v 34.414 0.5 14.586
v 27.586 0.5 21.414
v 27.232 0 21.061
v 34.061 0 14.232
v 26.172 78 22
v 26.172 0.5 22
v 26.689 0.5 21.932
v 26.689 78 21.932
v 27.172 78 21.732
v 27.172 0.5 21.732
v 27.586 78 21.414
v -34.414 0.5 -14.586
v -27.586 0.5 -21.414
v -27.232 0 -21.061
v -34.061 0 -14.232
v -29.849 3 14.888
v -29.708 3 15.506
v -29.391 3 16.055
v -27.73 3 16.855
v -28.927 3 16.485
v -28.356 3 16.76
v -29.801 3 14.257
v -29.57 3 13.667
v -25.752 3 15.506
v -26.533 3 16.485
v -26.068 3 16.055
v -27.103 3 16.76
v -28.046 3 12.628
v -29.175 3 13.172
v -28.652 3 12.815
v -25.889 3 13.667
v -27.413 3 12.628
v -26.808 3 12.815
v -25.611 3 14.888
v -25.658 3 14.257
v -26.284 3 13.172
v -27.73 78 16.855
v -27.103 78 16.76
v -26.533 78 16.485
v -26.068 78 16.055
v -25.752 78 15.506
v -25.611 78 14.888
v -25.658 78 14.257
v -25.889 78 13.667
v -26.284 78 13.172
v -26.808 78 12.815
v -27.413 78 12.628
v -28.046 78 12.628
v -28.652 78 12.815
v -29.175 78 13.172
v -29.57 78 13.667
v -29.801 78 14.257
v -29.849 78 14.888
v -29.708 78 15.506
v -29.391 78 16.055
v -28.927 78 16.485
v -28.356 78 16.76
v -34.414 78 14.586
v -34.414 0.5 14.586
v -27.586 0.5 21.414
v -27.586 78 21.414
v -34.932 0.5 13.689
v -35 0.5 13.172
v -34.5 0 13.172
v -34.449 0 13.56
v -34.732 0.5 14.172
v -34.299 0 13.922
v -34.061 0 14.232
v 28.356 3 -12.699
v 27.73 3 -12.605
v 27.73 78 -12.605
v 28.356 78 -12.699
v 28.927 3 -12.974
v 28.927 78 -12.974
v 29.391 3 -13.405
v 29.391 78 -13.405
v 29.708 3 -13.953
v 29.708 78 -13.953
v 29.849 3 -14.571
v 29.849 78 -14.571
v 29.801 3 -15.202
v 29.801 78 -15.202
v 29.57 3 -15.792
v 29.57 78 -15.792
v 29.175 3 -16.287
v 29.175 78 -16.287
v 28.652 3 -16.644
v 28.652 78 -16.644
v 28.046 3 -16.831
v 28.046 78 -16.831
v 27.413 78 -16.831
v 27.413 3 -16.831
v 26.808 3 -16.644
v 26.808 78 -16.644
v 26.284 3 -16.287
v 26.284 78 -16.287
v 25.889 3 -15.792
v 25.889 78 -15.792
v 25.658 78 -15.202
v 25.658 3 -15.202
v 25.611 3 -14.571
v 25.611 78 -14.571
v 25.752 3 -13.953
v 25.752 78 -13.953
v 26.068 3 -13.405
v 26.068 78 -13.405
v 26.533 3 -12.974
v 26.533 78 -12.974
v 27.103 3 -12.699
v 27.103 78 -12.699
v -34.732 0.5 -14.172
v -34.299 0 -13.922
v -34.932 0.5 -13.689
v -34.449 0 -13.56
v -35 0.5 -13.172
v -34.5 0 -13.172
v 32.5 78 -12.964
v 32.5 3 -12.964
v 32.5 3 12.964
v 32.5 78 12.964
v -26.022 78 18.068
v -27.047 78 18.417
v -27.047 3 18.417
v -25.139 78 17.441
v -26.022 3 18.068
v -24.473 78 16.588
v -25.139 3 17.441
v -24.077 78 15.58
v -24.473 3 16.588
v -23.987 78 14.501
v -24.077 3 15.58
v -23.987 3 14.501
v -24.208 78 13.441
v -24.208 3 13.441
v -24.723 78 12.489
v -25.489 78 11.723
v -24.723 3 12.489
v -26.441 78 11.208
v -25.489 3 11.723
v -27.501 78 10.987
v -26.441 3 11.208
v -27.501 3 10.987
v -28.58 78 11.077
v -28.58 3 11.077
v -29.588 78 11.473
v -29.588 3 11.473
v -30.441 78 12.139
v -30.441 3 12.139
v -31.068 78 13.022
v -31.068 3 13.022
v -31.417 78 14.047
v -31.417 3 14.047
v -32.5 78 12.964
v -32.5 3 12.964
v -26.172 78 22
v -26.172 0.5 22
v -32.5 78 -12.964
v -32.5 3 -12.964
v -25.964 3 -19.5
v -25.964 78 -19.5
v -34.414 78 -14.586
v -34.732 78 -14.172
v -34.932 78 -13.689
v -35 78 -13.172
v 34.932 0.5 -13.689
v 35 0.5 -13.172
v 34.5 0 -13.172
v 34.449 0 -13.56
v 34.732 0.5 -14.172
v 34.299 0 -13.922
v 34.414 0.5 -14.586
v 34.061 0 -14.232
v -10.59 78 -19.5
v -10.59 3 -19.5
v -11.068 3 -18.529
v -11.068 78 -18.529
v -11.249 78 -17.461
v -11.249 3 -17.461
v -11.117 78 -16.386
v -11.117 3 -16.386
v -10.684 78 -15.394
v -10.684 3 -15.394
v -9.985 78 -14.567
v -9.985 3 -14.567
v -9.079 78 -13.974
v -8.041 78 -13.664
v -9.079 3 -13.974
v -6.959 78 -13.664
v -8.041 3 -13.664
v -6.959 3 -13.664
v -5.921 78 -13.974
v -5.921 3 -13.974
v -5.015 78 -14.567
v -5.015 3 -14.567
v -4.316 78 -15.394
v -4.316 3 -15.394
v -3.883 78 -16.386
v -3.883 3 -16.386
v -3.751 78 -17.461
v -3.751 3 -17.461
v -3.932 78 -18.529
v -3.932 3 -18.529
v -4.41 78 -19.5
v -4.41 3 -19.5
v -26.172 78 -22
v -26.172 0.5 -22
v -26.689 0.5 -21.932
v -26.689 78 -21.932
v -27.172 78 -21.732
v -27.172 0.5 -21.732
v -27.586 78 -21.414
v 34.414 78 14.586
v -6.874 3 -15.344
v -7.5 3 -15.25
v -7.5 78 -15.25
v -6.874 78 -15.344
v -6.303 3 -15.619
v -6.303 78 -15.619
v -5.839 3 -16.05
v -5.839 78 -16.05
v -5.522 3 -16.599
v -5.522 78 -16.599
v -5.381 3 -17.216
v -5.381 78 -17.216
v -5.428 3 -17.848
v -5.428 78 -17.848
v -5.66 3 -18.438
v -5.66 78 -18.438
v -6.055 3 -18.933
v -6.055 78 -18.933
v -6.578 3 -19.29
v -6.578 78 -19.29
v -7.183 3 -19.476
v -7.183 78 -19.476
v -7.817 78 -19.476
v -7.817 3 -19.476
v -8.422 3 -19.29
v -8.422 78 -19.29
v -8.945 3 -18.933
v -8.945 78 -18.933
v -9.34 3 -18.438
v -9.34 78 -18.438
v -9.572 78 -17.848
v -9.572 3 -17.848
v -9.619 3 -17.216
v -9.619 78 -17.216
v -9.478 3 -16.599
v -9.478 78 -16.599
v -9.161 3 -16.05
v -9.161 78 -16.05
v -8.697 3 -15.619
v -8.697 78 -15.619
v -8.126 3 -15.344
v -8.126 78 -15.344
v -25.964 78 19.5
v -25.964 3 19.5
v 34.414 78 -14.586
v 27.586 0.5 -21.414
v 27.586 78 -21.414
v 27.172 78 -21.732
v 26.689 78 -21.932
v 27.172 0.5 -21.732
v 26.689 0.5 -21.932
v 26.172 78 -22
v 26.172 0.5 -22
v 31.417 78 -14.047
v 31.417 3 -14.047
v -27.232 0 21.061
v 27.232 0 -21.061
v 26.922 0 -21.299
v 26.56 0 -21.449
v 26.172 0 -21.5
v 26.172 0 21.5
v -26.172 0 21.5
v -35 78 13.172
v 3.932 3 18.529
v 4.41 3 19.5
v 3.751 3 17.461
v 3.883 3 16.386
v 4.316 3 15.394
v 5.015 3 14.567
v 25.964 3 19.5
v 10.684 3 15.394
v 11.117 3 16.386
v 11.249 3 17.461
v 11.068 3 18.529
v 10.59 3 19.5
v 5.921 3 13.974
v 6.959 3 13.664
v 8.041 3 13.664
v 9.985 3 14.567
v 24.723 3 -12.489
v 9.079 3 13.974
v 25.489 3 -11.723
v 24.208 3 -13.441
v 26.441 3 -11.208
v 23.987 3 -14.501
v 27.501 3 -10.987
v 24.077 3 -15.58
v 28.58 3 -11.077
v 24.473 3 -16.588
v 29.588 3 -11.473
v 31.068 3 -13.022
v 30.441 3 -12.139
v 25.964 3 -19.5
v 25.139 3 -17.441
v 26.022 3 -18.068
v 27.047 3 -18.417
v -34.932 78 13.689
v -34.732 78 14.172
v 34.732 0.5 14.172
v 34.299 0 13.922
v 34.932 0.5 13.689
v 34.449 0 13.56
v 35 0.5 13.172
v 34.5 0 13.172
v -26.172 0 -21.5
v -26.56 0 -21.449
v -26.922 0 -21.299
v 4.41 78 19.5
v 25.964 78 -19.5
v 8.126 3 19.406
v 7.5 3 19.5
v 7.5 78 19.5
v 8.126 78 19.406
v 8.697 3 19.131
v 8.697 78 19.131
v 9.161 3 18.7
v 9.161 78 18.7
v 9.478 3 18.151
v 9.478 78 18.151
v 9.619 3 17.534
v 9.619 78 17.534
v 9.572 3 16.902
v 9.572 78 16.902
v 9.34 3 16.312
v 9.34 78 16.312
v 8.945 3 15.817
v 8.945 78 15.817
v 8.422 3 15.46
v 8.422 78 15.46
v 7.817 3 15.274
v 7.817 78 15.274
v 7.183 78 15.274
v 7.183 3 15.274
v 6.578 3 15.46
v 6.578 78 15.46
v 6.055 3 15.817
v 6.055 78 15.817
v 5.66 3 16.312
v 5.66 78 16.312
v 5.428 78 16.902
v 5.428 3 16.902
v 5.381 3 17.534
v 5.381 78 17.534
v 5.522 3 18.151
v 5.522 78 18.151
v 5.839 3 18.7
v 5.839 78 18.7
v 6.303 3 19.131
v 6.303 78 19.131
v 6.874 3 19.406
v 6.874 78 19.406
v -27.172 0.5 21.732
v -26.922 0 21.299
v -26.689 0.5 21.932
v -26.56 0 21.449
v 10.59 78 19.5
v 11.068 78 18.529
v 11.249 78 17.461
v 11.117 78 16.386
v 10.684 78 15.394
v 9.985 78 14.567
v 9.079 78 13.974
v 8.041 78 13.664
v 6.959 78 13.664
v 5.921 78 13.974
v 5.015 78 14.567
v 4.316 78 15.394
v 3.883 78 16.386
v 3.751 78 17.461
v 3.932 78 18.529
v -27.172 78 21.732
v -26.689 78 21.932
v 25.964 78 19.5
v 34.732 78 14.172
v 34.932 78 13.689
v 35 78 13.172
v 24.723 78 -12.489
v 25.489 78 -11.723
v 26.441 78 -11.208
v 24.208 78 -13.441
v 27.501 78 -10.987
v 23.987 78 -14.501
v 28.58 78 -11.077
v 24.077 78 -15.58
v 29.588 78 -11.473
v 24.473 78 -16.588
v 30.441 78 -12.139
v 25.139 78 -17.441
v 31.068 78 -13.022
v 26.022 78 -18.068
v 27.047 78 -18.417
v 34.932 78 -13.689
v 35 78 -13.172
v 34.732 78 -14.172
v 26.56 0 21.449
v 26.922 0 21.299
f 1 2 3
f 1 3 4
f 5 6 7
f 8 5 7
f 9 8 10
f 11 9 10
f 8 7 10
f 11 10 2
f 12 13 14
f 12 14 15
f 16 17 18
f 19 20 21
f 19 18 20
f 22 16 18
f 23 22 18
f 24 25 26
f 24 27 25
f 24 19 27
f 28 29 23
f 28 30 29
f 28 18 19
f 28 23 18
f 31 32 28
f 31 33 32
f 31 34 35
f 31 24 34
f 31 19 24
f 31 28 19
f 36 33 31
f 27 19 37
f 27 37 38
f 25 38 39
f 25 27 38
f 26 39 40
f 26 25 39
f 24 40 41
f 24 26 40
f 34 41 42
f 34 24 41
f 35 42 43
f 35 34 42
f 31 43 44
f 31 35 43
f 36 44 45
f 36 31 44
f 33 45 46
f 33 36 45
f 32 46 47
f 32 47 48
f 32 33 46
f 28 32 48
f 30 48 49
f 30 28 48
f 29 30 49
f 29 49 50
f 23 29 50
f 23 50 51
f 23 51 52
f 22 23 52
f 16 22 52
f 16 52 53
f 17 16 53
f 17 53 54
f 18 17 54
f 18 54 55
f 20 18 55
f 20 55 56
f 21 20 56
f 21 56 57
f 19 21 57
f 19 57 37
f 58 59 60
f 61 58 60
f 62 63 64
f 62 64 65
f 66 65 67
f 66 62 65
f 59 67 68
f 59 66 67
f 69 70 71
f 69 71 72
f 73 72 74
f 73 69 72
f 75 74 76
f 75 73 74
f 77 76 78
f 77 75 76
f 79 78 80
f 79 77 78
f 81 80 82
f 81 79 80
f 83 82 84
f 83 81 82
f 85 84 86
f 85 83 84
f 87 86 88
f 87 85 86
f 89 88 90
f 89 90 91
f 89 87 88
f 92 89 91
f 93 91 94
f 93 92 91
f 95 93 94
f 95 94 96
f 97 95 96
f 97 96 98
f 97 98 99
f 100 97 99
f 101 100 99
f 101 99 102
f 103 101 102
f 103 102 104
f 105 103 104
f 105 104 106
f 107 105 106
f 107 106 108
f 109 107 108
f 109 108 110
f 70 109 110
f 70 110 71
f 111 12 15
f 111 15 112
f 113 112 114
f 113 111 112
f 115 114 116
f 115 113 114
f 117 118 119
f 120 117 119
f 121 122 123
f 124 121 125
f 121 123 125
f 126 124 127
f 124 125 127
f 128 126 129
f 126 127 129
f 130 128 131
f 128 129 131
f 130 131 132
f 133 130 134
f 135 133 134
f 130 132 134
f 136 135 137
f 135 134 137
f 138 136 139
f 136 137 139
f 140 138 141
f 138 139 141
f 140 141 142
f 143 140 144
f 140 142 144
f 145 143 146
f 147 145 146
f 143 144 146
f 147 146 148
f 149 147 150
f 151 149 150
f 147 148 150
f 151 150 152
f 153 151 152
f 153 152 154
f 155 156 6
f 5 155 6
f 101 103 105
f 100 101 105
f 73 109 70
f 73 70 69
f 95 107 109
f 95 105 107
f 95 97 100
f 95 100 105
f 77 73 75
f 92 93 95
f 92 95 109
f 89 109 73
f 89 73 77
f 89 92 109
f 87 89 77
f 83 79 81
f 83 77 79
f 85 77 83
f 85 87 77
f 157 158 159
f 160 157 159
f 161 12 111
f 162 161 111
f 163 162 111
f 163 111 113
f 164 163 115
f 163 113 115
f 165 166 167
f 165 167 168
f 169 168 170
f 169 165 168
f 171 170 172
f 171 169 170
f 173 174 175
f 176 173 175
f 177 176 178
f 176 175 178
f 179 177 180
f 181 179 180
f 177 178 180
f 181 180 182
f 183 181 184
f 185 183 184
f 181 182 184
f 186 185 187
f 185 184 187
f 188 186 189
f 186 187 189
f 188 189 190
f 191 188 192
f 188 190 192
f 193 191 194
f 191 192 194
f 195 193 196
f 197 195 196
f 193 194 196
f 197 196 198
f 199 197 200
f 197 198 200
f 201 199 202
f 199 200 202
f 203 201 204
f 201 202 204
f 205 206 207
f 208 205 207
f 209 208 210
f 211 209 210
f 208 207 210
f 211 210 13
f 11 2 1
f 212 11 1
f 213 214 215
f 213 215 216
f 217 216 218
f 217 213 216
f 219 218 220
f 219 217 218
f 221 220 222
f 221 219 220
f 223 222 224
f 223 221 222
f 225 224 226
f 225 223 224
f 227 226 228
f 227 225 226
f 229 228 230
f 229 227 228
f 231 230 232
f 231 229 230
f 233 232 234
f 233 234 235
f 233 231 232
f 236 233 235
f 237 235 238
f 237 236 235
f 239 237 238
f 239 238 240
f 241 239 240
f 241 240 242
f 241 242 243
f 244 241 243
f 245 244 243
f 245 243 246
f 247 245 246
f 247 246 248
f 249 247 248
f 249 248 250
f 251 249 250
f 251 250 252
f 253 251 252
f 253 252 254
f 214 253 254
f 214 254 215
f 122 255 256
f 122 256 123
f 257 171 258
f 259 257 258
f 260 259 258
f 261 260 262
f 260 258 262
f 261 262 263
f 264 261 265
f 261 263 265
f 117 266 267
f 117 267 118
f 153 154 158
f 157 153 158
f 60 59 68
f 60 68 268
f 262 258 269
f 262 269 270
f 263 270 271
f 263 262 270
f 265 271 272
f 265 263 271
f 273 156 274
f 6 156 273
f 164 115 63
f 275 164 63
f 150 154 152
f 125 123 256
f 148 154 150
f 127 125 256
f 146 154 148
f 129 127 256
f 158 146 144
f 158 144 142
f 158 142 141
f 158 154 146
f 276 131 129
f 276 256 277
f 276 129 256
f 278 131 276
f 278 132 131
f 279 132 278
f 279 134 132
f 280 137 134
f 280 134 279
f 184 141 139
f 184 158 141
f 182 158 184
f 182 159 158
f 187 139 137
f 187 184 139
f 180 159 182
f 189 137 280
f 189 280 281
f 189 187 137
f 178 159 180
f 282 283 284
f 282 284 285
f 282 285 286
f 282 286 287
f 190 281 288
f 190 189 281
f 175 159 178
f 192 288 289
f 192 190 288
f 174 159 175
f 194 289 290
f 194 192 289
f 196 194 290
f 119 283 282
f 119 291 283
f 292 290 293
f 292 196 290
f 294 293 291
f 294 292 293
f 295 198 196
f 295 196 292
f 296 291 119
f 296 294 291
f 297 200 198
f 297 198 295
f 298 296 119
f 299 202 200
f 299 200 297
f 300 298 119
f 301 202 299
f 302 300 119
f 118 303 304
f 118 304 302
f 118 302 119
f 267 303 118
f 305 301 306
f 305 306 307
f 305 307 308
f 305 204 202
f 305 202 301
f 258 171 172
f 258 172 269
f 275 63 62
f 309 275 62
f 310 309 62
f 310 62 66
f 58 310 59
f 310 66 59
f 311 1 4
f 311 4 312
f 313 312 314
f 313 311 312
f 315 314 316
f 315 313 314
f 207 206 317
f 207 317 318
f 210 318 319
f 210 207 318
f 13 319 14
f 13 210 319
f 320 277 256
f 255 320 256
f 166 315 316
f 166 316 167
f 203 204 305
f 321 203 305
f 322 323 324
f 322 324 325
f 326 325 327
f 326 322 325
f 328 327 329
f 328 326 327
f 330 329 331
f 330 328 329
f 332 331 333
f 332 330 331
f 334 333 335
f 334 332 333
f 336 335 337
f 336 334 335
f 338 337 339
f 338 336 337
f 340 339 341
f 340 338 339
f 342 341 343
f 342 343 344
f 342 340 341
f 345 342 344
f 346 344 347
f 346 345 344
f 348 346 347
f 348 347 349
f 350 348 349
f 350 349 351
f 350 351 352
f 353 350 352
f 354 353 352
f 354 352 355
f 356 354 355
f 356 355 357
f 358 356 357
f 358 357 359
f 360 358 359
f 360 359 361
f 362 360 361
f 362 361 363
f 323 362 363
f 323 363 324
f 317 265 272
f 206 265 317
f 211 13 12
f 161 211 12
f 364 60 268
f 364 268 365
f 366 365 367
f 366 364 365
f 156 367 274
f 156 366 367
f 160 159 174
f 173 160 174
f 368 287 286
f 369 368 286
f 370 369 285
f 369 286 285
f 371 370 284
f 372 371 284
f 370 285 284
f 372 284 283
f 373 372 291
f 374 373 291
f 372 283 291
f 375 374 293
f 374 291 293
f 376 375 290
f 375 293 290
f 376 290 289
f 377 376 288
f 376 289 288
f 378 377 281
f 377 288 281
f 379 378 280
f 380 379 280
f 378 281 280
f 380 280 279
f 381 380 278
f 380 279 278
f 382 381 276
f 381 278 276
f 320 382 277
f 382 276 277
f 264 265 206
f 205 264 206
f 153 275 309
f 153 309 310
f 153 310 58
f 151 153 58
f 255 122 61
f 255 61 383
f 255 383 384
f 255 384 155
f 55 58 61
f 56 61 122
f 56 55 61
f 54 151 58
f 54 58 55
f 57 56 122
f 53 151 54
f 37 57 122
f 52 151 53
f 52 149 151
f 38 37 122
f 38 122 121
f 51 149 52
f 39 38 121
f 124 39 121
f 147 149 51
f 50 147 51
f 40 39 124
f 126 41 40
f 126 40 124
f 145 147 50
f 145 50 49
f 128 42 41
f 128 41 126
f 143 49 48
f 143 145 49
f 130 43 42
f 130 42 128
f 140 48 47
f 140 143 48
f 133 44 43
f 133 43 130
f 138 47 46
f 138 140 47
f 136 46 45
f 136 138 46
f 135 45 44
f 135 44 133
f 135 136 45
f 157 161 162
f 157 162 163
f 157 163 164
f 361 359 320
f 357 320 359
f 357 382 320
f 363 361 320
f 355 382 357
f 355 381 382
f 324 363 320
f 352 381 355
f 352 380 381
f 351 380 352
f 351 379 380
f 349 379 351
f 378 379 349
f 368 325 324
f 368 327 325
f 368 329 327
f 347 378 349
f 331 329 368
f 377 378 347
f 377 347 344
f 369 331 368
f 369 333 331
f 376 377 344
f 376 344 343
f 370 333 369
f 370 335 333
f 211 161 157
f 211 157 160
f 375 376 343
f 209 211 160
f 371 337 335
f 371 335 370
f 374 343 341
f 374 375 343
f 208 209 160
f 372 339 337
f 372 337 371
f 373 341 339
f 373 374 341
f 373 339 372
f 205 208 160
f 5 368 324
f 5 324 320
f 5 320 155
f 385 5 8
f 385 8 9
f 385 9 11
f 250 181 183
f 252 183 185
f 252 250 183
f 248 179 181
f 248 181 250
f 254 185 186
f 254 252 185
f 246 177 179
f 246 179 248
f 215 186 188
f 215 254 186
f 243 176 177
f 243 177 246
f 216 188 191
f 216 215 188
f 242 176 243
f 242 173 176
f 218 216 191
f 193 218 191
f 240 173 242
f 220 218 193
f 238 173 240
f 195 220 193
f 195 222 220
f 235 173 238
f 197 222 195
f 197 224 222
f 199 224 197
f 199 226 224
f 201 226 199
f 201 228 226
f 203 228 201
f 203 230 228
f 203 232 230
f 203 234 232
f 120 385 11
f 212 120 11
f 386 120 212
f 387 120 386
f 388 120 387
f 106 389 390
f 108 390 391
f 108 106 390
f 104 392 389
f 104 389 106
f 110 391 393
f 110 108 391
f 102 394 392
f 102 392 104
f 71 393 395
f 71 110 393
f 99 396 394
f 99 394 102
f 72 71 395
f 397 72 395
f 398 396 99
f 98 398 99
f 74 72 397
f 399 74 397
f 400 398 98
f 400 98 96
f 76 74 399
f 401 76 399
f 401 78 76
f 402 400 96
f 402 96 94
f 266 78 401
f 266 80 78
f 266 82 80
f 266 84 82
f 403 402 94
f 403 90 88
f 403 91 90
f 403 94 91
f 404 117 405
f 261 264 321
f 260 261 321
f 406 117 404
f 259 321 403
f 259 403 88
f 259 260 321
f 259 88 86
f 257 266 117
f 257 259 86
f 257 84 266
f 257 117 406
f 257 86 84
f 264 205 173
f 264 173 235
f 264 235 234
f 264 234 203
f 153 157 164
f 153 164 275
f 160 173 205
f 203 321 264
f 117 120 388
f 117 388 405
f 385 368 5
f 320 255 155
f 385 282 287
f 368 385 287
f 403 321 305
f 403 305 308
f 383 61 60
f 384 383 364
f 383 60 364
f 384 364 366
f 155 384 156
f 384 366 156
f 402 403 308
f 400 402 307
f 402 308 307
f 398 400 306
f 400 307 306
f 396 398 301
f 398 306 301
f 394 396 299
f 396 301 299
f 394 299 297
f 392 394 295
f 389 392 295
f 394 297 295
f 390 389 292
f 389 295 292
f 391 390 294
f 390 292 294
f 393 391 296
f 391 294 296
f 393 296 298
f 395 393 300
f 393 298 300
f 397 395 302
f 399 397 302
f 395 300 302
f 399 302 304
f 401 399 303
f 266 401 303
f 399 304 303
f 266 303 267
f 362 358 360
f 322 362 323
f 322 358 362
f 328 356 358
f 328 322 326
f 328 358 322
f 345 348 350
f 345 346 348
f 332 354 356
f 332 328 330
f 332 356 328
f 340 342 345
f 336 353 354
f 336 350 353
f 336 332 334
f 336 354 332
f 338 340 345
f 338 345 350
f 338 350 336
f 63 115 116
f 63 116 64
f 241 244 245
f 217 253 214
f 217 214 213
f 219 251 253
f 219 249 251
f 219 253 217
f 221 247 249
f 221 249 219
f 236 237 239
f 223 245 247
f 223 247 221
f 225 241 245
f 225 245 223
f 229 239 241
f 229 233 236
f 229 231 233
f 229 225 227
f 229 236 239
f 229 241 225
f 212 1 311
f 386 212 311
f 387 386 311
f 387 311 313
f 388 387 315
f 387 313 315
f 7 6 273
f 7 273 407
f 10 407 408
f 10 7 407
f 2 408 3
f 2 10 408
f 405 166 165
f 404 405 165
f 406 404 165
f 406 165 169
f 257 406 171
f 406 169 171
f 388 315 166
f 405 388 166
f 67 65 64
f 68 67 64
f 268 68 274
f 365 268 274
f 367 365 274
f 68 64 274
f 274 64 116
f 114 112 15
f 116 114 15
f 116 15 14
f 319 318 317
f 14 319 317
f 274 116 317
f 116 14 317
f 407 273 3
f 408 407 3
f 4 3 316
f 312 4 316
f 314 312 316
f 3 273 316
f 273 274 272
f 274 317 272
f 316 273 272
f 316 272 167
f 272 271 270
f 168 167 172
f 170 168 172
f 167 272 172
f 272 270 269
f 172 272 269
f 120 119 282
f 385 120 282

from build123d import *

# Parameters (mm, degrees)
BOSS_EXTRUDE1_DEPTH = 3
SKETCH1_4_R         = 2.125
BOSS_EXTRUDE2_DEPTH = 78
CHAMFER1_SIZE       = 0.5


with BuildPart() as part:
    # Sketch1 → Boss-Extrude1 (new body)
    with BuildSketch(Plane(origin=(0, 0, 0), x_dir=(1, 0, 0), z_dir=(0, 1, 0))):
        with BuildLine():
            Line((26.171572875, 22), (-26.171572875, 22))
            ThreePointArc((-26.171572875, 22), (-26.93693974, 21.847759065), (-27.585786438, 21.414213562))
            Line((-27.585786438, 21.414213562), (-34.414213562, 14.585786438))
            ThreePointArc((-34.414213562, 14.585786438), (-34.847759065, 13.93693974), (-35, 13.171572875))
            Line((-35, 13.171572875), (-35, -13.171572875))
            ThreePointArc((-35, -13.171572875), (-34.847759065, -13.93693974), (-34.414213562, -14.585786438))
            Line((-34.414213562, -14.585786438), (-27.585786438, -21.414213562))
            ThreePointArc((-27.585786438, -21.414213562), (-26.93693974, -21.847759065), (-26.171572875, -22))
            Line((-26.171572875, -22), (26.171572875, -22))
            ThreePointArc((26.171572875, -22), (26.93693974, -21.847759065), (27.585786438, -21.414213562))
            Line((27.585786438, -21.414213562), (34.414213562, -14.585786438))
            ThreePointArc((34.414213562, -14.585786438), (34.847759065, -13.93693974), (35, -13.171572875))
            Line((35, -13.171572875), (35, 13.171572875))
            ThreePointArc((35, 13.171572875), (34.847759065, 13.93693974), (34.414213562, 14.585786438))
            Line((34.414213562, 14.585786438), (27.585786438, 21.414213562))
            ThreePointArc((27.585786438, 21.414213562), (26.93693974, 21.847759065), (26.171572875, 22))
        make_face()
    extrude(amount=BOSS_EXTRUDE1_DEPTH)

    # Sketch1<4> → Boss-Extrude2 (add)
    with BuildSketch(Plane(origin=(0, 0, 0), x_dir=(1, 0, 0), z_dir=(0, 1, 0))):
        with BuildLine():
            ThreePointArc((27.585786438, 21.414213562), (26.93693974, 21.847759065), (26.171572875, 22))
            Line((26.171572875, 22), (-26.171572875, 22))
            ThreePointArc((-26.171572875, 22), (-26.93693974, 21.847759065), (-27.585786438, 21.414213562))
            Line((-27.585786438, 21.414213562), (-34.414213562, 14.585786438))
            ThreePointArc((-34.414213562, 14.585786438), (-34.847759065, 13.93693974), (-35, 13.171572875))
            Line((-35, 13.171572875), (-35, -13.171572875))
            ThreePointArc((-35, -13.171572875), (-34.847759065, -13.93693974), (-34.414213562, -14.585786438))
            Line((-34.414213562, -14.585786438), (-27.585786438, -21.414213562))
            ThreePointArc((-27.585786438, -21.414213562), (-26.93693974, -21.847759065), (-26.171572875, -22))
            Line((-26.171572875, -22), (26.171572875, -22))
            ThreePointArc((26.171572875, -22), (26.93693974, -21.847759065), (27.585786438, -21.414213562))
            Line((27.585786438, -21.414213562), (34.414213562, -14.585786438))
            ThreePointArc((34.414213562, -14.585786438), (34.847759065, -13.93693974), (35, -13.171572875))
            Line((35, -13.171572875), (35, 13.171572875))
            ThreePointArc((35, 13.171572875), (34.847759065, 13.93693974), (34.414213562, 14.585786438))
            Line((34.414213562, 14.585786438), (27.585786438, 21.414213562))
        make_face()
        with BuildLine():
            Line((-32.5, -12.964466094), (-32.5, 12.964466094))
            Line((-32.5, 12.964466094), (-25.964466094, 19.5))
            Line((-25.964466094, 19.5), (-10.589801774, 19.5))
            ThreePointArc((-10.589801774, 19.5), (-7.5, 13.625), (-4.410198226, 19.5))
            Line((-4.410198226, 19.5), (25.964466094, 19.5))
            Line((25.964466094, 19.5), (27.04741326, 18.417052834))
            ThreePointArc((27.04741326, 18.417052834), (25.077980708, 12.077980708), (31.417052834, 14.04741326))
            Line((31.417052834, 14.04741326), (32.5, 12.964466094))
            Line((32.5, 12.964466094), (32.5, -12.964466094))
            Line((32.5, -12.964466094), (25.964466094, -19.5))
            Line((25.964466094, -19.5), (10.589801774, -19.5))
            ThreePointArc((10.589801774, -19.5), (7.5, -13.625), (4.410198226, -19.5))
            Line((4.410198226, -19.5), (-25.964466094, -19.5))
            Line((-25.964466094, -19.5), (-27.04741326, -18.417052834))
            ThreePointArc((-27.04741326, -18.417052834), (-25.077980708, -12.077980708), (-31.417052834, -14.04741326))
            Line((-31.417052834, -14.04741326), (-32.5, -12.964466094))
        make_face(mode=Mode.SUBTRACT)
        with Locations(Location((-27.729631137, -14.729631137, 0), (0, 0, 270))):
            Circle(SKETCH1_4_R, mode=Mode.SUBTRACT)
        with Locations(Location((-7.5, 17.375, 0), (0, 0, 270))):
            Circle(SKETCH1_4_R, mode=Mode.SUBTRACT)
        with Locations(Location((7.5, -17.375, 0), (0, 0, 270))):
            Circle(SKETCH1_4_R, mode=Mode.SUBTRACT)
        with Locations(Location((27.729631137, 14.729631137, 0), (0, 0, 270))):
            Circle(SKETCH1_4_R, mode=Mode.SUBTRACT)
    extrude(amount=BOSS_EXTRUDE2_DEPTH)

    # Chamfer1
    chamfer1_edges = [part.edges().sort_by_distance(p)[0] for p in [
        (-31, 0, 18),
        (-34.847759065, 0, 13.93693974),
        (-35, 0, 0),
        (-34.847759065, 0, -13.93693974),
        (-31, 0, -18),
        (-26.93693974, 0, -21.847759065),
        (0, 0, -22),
        (26.93693974, 0, -21.847759065),
        (31, 0, -18),
        (34.847759065, 0, -13.93693974),
        (35, 0, 0),
        (34.847759065, 0, 13.93693974),
        (31, 0, 18),
        (26.93693974, 0, 21.847759065),
        (0, 0, 22),
        (-26.93693974, 0, 21.847759065),
    ]]
    chamfer(chamfer1_edges, length=CHAMFER1_SIZE)


solid = part.part
